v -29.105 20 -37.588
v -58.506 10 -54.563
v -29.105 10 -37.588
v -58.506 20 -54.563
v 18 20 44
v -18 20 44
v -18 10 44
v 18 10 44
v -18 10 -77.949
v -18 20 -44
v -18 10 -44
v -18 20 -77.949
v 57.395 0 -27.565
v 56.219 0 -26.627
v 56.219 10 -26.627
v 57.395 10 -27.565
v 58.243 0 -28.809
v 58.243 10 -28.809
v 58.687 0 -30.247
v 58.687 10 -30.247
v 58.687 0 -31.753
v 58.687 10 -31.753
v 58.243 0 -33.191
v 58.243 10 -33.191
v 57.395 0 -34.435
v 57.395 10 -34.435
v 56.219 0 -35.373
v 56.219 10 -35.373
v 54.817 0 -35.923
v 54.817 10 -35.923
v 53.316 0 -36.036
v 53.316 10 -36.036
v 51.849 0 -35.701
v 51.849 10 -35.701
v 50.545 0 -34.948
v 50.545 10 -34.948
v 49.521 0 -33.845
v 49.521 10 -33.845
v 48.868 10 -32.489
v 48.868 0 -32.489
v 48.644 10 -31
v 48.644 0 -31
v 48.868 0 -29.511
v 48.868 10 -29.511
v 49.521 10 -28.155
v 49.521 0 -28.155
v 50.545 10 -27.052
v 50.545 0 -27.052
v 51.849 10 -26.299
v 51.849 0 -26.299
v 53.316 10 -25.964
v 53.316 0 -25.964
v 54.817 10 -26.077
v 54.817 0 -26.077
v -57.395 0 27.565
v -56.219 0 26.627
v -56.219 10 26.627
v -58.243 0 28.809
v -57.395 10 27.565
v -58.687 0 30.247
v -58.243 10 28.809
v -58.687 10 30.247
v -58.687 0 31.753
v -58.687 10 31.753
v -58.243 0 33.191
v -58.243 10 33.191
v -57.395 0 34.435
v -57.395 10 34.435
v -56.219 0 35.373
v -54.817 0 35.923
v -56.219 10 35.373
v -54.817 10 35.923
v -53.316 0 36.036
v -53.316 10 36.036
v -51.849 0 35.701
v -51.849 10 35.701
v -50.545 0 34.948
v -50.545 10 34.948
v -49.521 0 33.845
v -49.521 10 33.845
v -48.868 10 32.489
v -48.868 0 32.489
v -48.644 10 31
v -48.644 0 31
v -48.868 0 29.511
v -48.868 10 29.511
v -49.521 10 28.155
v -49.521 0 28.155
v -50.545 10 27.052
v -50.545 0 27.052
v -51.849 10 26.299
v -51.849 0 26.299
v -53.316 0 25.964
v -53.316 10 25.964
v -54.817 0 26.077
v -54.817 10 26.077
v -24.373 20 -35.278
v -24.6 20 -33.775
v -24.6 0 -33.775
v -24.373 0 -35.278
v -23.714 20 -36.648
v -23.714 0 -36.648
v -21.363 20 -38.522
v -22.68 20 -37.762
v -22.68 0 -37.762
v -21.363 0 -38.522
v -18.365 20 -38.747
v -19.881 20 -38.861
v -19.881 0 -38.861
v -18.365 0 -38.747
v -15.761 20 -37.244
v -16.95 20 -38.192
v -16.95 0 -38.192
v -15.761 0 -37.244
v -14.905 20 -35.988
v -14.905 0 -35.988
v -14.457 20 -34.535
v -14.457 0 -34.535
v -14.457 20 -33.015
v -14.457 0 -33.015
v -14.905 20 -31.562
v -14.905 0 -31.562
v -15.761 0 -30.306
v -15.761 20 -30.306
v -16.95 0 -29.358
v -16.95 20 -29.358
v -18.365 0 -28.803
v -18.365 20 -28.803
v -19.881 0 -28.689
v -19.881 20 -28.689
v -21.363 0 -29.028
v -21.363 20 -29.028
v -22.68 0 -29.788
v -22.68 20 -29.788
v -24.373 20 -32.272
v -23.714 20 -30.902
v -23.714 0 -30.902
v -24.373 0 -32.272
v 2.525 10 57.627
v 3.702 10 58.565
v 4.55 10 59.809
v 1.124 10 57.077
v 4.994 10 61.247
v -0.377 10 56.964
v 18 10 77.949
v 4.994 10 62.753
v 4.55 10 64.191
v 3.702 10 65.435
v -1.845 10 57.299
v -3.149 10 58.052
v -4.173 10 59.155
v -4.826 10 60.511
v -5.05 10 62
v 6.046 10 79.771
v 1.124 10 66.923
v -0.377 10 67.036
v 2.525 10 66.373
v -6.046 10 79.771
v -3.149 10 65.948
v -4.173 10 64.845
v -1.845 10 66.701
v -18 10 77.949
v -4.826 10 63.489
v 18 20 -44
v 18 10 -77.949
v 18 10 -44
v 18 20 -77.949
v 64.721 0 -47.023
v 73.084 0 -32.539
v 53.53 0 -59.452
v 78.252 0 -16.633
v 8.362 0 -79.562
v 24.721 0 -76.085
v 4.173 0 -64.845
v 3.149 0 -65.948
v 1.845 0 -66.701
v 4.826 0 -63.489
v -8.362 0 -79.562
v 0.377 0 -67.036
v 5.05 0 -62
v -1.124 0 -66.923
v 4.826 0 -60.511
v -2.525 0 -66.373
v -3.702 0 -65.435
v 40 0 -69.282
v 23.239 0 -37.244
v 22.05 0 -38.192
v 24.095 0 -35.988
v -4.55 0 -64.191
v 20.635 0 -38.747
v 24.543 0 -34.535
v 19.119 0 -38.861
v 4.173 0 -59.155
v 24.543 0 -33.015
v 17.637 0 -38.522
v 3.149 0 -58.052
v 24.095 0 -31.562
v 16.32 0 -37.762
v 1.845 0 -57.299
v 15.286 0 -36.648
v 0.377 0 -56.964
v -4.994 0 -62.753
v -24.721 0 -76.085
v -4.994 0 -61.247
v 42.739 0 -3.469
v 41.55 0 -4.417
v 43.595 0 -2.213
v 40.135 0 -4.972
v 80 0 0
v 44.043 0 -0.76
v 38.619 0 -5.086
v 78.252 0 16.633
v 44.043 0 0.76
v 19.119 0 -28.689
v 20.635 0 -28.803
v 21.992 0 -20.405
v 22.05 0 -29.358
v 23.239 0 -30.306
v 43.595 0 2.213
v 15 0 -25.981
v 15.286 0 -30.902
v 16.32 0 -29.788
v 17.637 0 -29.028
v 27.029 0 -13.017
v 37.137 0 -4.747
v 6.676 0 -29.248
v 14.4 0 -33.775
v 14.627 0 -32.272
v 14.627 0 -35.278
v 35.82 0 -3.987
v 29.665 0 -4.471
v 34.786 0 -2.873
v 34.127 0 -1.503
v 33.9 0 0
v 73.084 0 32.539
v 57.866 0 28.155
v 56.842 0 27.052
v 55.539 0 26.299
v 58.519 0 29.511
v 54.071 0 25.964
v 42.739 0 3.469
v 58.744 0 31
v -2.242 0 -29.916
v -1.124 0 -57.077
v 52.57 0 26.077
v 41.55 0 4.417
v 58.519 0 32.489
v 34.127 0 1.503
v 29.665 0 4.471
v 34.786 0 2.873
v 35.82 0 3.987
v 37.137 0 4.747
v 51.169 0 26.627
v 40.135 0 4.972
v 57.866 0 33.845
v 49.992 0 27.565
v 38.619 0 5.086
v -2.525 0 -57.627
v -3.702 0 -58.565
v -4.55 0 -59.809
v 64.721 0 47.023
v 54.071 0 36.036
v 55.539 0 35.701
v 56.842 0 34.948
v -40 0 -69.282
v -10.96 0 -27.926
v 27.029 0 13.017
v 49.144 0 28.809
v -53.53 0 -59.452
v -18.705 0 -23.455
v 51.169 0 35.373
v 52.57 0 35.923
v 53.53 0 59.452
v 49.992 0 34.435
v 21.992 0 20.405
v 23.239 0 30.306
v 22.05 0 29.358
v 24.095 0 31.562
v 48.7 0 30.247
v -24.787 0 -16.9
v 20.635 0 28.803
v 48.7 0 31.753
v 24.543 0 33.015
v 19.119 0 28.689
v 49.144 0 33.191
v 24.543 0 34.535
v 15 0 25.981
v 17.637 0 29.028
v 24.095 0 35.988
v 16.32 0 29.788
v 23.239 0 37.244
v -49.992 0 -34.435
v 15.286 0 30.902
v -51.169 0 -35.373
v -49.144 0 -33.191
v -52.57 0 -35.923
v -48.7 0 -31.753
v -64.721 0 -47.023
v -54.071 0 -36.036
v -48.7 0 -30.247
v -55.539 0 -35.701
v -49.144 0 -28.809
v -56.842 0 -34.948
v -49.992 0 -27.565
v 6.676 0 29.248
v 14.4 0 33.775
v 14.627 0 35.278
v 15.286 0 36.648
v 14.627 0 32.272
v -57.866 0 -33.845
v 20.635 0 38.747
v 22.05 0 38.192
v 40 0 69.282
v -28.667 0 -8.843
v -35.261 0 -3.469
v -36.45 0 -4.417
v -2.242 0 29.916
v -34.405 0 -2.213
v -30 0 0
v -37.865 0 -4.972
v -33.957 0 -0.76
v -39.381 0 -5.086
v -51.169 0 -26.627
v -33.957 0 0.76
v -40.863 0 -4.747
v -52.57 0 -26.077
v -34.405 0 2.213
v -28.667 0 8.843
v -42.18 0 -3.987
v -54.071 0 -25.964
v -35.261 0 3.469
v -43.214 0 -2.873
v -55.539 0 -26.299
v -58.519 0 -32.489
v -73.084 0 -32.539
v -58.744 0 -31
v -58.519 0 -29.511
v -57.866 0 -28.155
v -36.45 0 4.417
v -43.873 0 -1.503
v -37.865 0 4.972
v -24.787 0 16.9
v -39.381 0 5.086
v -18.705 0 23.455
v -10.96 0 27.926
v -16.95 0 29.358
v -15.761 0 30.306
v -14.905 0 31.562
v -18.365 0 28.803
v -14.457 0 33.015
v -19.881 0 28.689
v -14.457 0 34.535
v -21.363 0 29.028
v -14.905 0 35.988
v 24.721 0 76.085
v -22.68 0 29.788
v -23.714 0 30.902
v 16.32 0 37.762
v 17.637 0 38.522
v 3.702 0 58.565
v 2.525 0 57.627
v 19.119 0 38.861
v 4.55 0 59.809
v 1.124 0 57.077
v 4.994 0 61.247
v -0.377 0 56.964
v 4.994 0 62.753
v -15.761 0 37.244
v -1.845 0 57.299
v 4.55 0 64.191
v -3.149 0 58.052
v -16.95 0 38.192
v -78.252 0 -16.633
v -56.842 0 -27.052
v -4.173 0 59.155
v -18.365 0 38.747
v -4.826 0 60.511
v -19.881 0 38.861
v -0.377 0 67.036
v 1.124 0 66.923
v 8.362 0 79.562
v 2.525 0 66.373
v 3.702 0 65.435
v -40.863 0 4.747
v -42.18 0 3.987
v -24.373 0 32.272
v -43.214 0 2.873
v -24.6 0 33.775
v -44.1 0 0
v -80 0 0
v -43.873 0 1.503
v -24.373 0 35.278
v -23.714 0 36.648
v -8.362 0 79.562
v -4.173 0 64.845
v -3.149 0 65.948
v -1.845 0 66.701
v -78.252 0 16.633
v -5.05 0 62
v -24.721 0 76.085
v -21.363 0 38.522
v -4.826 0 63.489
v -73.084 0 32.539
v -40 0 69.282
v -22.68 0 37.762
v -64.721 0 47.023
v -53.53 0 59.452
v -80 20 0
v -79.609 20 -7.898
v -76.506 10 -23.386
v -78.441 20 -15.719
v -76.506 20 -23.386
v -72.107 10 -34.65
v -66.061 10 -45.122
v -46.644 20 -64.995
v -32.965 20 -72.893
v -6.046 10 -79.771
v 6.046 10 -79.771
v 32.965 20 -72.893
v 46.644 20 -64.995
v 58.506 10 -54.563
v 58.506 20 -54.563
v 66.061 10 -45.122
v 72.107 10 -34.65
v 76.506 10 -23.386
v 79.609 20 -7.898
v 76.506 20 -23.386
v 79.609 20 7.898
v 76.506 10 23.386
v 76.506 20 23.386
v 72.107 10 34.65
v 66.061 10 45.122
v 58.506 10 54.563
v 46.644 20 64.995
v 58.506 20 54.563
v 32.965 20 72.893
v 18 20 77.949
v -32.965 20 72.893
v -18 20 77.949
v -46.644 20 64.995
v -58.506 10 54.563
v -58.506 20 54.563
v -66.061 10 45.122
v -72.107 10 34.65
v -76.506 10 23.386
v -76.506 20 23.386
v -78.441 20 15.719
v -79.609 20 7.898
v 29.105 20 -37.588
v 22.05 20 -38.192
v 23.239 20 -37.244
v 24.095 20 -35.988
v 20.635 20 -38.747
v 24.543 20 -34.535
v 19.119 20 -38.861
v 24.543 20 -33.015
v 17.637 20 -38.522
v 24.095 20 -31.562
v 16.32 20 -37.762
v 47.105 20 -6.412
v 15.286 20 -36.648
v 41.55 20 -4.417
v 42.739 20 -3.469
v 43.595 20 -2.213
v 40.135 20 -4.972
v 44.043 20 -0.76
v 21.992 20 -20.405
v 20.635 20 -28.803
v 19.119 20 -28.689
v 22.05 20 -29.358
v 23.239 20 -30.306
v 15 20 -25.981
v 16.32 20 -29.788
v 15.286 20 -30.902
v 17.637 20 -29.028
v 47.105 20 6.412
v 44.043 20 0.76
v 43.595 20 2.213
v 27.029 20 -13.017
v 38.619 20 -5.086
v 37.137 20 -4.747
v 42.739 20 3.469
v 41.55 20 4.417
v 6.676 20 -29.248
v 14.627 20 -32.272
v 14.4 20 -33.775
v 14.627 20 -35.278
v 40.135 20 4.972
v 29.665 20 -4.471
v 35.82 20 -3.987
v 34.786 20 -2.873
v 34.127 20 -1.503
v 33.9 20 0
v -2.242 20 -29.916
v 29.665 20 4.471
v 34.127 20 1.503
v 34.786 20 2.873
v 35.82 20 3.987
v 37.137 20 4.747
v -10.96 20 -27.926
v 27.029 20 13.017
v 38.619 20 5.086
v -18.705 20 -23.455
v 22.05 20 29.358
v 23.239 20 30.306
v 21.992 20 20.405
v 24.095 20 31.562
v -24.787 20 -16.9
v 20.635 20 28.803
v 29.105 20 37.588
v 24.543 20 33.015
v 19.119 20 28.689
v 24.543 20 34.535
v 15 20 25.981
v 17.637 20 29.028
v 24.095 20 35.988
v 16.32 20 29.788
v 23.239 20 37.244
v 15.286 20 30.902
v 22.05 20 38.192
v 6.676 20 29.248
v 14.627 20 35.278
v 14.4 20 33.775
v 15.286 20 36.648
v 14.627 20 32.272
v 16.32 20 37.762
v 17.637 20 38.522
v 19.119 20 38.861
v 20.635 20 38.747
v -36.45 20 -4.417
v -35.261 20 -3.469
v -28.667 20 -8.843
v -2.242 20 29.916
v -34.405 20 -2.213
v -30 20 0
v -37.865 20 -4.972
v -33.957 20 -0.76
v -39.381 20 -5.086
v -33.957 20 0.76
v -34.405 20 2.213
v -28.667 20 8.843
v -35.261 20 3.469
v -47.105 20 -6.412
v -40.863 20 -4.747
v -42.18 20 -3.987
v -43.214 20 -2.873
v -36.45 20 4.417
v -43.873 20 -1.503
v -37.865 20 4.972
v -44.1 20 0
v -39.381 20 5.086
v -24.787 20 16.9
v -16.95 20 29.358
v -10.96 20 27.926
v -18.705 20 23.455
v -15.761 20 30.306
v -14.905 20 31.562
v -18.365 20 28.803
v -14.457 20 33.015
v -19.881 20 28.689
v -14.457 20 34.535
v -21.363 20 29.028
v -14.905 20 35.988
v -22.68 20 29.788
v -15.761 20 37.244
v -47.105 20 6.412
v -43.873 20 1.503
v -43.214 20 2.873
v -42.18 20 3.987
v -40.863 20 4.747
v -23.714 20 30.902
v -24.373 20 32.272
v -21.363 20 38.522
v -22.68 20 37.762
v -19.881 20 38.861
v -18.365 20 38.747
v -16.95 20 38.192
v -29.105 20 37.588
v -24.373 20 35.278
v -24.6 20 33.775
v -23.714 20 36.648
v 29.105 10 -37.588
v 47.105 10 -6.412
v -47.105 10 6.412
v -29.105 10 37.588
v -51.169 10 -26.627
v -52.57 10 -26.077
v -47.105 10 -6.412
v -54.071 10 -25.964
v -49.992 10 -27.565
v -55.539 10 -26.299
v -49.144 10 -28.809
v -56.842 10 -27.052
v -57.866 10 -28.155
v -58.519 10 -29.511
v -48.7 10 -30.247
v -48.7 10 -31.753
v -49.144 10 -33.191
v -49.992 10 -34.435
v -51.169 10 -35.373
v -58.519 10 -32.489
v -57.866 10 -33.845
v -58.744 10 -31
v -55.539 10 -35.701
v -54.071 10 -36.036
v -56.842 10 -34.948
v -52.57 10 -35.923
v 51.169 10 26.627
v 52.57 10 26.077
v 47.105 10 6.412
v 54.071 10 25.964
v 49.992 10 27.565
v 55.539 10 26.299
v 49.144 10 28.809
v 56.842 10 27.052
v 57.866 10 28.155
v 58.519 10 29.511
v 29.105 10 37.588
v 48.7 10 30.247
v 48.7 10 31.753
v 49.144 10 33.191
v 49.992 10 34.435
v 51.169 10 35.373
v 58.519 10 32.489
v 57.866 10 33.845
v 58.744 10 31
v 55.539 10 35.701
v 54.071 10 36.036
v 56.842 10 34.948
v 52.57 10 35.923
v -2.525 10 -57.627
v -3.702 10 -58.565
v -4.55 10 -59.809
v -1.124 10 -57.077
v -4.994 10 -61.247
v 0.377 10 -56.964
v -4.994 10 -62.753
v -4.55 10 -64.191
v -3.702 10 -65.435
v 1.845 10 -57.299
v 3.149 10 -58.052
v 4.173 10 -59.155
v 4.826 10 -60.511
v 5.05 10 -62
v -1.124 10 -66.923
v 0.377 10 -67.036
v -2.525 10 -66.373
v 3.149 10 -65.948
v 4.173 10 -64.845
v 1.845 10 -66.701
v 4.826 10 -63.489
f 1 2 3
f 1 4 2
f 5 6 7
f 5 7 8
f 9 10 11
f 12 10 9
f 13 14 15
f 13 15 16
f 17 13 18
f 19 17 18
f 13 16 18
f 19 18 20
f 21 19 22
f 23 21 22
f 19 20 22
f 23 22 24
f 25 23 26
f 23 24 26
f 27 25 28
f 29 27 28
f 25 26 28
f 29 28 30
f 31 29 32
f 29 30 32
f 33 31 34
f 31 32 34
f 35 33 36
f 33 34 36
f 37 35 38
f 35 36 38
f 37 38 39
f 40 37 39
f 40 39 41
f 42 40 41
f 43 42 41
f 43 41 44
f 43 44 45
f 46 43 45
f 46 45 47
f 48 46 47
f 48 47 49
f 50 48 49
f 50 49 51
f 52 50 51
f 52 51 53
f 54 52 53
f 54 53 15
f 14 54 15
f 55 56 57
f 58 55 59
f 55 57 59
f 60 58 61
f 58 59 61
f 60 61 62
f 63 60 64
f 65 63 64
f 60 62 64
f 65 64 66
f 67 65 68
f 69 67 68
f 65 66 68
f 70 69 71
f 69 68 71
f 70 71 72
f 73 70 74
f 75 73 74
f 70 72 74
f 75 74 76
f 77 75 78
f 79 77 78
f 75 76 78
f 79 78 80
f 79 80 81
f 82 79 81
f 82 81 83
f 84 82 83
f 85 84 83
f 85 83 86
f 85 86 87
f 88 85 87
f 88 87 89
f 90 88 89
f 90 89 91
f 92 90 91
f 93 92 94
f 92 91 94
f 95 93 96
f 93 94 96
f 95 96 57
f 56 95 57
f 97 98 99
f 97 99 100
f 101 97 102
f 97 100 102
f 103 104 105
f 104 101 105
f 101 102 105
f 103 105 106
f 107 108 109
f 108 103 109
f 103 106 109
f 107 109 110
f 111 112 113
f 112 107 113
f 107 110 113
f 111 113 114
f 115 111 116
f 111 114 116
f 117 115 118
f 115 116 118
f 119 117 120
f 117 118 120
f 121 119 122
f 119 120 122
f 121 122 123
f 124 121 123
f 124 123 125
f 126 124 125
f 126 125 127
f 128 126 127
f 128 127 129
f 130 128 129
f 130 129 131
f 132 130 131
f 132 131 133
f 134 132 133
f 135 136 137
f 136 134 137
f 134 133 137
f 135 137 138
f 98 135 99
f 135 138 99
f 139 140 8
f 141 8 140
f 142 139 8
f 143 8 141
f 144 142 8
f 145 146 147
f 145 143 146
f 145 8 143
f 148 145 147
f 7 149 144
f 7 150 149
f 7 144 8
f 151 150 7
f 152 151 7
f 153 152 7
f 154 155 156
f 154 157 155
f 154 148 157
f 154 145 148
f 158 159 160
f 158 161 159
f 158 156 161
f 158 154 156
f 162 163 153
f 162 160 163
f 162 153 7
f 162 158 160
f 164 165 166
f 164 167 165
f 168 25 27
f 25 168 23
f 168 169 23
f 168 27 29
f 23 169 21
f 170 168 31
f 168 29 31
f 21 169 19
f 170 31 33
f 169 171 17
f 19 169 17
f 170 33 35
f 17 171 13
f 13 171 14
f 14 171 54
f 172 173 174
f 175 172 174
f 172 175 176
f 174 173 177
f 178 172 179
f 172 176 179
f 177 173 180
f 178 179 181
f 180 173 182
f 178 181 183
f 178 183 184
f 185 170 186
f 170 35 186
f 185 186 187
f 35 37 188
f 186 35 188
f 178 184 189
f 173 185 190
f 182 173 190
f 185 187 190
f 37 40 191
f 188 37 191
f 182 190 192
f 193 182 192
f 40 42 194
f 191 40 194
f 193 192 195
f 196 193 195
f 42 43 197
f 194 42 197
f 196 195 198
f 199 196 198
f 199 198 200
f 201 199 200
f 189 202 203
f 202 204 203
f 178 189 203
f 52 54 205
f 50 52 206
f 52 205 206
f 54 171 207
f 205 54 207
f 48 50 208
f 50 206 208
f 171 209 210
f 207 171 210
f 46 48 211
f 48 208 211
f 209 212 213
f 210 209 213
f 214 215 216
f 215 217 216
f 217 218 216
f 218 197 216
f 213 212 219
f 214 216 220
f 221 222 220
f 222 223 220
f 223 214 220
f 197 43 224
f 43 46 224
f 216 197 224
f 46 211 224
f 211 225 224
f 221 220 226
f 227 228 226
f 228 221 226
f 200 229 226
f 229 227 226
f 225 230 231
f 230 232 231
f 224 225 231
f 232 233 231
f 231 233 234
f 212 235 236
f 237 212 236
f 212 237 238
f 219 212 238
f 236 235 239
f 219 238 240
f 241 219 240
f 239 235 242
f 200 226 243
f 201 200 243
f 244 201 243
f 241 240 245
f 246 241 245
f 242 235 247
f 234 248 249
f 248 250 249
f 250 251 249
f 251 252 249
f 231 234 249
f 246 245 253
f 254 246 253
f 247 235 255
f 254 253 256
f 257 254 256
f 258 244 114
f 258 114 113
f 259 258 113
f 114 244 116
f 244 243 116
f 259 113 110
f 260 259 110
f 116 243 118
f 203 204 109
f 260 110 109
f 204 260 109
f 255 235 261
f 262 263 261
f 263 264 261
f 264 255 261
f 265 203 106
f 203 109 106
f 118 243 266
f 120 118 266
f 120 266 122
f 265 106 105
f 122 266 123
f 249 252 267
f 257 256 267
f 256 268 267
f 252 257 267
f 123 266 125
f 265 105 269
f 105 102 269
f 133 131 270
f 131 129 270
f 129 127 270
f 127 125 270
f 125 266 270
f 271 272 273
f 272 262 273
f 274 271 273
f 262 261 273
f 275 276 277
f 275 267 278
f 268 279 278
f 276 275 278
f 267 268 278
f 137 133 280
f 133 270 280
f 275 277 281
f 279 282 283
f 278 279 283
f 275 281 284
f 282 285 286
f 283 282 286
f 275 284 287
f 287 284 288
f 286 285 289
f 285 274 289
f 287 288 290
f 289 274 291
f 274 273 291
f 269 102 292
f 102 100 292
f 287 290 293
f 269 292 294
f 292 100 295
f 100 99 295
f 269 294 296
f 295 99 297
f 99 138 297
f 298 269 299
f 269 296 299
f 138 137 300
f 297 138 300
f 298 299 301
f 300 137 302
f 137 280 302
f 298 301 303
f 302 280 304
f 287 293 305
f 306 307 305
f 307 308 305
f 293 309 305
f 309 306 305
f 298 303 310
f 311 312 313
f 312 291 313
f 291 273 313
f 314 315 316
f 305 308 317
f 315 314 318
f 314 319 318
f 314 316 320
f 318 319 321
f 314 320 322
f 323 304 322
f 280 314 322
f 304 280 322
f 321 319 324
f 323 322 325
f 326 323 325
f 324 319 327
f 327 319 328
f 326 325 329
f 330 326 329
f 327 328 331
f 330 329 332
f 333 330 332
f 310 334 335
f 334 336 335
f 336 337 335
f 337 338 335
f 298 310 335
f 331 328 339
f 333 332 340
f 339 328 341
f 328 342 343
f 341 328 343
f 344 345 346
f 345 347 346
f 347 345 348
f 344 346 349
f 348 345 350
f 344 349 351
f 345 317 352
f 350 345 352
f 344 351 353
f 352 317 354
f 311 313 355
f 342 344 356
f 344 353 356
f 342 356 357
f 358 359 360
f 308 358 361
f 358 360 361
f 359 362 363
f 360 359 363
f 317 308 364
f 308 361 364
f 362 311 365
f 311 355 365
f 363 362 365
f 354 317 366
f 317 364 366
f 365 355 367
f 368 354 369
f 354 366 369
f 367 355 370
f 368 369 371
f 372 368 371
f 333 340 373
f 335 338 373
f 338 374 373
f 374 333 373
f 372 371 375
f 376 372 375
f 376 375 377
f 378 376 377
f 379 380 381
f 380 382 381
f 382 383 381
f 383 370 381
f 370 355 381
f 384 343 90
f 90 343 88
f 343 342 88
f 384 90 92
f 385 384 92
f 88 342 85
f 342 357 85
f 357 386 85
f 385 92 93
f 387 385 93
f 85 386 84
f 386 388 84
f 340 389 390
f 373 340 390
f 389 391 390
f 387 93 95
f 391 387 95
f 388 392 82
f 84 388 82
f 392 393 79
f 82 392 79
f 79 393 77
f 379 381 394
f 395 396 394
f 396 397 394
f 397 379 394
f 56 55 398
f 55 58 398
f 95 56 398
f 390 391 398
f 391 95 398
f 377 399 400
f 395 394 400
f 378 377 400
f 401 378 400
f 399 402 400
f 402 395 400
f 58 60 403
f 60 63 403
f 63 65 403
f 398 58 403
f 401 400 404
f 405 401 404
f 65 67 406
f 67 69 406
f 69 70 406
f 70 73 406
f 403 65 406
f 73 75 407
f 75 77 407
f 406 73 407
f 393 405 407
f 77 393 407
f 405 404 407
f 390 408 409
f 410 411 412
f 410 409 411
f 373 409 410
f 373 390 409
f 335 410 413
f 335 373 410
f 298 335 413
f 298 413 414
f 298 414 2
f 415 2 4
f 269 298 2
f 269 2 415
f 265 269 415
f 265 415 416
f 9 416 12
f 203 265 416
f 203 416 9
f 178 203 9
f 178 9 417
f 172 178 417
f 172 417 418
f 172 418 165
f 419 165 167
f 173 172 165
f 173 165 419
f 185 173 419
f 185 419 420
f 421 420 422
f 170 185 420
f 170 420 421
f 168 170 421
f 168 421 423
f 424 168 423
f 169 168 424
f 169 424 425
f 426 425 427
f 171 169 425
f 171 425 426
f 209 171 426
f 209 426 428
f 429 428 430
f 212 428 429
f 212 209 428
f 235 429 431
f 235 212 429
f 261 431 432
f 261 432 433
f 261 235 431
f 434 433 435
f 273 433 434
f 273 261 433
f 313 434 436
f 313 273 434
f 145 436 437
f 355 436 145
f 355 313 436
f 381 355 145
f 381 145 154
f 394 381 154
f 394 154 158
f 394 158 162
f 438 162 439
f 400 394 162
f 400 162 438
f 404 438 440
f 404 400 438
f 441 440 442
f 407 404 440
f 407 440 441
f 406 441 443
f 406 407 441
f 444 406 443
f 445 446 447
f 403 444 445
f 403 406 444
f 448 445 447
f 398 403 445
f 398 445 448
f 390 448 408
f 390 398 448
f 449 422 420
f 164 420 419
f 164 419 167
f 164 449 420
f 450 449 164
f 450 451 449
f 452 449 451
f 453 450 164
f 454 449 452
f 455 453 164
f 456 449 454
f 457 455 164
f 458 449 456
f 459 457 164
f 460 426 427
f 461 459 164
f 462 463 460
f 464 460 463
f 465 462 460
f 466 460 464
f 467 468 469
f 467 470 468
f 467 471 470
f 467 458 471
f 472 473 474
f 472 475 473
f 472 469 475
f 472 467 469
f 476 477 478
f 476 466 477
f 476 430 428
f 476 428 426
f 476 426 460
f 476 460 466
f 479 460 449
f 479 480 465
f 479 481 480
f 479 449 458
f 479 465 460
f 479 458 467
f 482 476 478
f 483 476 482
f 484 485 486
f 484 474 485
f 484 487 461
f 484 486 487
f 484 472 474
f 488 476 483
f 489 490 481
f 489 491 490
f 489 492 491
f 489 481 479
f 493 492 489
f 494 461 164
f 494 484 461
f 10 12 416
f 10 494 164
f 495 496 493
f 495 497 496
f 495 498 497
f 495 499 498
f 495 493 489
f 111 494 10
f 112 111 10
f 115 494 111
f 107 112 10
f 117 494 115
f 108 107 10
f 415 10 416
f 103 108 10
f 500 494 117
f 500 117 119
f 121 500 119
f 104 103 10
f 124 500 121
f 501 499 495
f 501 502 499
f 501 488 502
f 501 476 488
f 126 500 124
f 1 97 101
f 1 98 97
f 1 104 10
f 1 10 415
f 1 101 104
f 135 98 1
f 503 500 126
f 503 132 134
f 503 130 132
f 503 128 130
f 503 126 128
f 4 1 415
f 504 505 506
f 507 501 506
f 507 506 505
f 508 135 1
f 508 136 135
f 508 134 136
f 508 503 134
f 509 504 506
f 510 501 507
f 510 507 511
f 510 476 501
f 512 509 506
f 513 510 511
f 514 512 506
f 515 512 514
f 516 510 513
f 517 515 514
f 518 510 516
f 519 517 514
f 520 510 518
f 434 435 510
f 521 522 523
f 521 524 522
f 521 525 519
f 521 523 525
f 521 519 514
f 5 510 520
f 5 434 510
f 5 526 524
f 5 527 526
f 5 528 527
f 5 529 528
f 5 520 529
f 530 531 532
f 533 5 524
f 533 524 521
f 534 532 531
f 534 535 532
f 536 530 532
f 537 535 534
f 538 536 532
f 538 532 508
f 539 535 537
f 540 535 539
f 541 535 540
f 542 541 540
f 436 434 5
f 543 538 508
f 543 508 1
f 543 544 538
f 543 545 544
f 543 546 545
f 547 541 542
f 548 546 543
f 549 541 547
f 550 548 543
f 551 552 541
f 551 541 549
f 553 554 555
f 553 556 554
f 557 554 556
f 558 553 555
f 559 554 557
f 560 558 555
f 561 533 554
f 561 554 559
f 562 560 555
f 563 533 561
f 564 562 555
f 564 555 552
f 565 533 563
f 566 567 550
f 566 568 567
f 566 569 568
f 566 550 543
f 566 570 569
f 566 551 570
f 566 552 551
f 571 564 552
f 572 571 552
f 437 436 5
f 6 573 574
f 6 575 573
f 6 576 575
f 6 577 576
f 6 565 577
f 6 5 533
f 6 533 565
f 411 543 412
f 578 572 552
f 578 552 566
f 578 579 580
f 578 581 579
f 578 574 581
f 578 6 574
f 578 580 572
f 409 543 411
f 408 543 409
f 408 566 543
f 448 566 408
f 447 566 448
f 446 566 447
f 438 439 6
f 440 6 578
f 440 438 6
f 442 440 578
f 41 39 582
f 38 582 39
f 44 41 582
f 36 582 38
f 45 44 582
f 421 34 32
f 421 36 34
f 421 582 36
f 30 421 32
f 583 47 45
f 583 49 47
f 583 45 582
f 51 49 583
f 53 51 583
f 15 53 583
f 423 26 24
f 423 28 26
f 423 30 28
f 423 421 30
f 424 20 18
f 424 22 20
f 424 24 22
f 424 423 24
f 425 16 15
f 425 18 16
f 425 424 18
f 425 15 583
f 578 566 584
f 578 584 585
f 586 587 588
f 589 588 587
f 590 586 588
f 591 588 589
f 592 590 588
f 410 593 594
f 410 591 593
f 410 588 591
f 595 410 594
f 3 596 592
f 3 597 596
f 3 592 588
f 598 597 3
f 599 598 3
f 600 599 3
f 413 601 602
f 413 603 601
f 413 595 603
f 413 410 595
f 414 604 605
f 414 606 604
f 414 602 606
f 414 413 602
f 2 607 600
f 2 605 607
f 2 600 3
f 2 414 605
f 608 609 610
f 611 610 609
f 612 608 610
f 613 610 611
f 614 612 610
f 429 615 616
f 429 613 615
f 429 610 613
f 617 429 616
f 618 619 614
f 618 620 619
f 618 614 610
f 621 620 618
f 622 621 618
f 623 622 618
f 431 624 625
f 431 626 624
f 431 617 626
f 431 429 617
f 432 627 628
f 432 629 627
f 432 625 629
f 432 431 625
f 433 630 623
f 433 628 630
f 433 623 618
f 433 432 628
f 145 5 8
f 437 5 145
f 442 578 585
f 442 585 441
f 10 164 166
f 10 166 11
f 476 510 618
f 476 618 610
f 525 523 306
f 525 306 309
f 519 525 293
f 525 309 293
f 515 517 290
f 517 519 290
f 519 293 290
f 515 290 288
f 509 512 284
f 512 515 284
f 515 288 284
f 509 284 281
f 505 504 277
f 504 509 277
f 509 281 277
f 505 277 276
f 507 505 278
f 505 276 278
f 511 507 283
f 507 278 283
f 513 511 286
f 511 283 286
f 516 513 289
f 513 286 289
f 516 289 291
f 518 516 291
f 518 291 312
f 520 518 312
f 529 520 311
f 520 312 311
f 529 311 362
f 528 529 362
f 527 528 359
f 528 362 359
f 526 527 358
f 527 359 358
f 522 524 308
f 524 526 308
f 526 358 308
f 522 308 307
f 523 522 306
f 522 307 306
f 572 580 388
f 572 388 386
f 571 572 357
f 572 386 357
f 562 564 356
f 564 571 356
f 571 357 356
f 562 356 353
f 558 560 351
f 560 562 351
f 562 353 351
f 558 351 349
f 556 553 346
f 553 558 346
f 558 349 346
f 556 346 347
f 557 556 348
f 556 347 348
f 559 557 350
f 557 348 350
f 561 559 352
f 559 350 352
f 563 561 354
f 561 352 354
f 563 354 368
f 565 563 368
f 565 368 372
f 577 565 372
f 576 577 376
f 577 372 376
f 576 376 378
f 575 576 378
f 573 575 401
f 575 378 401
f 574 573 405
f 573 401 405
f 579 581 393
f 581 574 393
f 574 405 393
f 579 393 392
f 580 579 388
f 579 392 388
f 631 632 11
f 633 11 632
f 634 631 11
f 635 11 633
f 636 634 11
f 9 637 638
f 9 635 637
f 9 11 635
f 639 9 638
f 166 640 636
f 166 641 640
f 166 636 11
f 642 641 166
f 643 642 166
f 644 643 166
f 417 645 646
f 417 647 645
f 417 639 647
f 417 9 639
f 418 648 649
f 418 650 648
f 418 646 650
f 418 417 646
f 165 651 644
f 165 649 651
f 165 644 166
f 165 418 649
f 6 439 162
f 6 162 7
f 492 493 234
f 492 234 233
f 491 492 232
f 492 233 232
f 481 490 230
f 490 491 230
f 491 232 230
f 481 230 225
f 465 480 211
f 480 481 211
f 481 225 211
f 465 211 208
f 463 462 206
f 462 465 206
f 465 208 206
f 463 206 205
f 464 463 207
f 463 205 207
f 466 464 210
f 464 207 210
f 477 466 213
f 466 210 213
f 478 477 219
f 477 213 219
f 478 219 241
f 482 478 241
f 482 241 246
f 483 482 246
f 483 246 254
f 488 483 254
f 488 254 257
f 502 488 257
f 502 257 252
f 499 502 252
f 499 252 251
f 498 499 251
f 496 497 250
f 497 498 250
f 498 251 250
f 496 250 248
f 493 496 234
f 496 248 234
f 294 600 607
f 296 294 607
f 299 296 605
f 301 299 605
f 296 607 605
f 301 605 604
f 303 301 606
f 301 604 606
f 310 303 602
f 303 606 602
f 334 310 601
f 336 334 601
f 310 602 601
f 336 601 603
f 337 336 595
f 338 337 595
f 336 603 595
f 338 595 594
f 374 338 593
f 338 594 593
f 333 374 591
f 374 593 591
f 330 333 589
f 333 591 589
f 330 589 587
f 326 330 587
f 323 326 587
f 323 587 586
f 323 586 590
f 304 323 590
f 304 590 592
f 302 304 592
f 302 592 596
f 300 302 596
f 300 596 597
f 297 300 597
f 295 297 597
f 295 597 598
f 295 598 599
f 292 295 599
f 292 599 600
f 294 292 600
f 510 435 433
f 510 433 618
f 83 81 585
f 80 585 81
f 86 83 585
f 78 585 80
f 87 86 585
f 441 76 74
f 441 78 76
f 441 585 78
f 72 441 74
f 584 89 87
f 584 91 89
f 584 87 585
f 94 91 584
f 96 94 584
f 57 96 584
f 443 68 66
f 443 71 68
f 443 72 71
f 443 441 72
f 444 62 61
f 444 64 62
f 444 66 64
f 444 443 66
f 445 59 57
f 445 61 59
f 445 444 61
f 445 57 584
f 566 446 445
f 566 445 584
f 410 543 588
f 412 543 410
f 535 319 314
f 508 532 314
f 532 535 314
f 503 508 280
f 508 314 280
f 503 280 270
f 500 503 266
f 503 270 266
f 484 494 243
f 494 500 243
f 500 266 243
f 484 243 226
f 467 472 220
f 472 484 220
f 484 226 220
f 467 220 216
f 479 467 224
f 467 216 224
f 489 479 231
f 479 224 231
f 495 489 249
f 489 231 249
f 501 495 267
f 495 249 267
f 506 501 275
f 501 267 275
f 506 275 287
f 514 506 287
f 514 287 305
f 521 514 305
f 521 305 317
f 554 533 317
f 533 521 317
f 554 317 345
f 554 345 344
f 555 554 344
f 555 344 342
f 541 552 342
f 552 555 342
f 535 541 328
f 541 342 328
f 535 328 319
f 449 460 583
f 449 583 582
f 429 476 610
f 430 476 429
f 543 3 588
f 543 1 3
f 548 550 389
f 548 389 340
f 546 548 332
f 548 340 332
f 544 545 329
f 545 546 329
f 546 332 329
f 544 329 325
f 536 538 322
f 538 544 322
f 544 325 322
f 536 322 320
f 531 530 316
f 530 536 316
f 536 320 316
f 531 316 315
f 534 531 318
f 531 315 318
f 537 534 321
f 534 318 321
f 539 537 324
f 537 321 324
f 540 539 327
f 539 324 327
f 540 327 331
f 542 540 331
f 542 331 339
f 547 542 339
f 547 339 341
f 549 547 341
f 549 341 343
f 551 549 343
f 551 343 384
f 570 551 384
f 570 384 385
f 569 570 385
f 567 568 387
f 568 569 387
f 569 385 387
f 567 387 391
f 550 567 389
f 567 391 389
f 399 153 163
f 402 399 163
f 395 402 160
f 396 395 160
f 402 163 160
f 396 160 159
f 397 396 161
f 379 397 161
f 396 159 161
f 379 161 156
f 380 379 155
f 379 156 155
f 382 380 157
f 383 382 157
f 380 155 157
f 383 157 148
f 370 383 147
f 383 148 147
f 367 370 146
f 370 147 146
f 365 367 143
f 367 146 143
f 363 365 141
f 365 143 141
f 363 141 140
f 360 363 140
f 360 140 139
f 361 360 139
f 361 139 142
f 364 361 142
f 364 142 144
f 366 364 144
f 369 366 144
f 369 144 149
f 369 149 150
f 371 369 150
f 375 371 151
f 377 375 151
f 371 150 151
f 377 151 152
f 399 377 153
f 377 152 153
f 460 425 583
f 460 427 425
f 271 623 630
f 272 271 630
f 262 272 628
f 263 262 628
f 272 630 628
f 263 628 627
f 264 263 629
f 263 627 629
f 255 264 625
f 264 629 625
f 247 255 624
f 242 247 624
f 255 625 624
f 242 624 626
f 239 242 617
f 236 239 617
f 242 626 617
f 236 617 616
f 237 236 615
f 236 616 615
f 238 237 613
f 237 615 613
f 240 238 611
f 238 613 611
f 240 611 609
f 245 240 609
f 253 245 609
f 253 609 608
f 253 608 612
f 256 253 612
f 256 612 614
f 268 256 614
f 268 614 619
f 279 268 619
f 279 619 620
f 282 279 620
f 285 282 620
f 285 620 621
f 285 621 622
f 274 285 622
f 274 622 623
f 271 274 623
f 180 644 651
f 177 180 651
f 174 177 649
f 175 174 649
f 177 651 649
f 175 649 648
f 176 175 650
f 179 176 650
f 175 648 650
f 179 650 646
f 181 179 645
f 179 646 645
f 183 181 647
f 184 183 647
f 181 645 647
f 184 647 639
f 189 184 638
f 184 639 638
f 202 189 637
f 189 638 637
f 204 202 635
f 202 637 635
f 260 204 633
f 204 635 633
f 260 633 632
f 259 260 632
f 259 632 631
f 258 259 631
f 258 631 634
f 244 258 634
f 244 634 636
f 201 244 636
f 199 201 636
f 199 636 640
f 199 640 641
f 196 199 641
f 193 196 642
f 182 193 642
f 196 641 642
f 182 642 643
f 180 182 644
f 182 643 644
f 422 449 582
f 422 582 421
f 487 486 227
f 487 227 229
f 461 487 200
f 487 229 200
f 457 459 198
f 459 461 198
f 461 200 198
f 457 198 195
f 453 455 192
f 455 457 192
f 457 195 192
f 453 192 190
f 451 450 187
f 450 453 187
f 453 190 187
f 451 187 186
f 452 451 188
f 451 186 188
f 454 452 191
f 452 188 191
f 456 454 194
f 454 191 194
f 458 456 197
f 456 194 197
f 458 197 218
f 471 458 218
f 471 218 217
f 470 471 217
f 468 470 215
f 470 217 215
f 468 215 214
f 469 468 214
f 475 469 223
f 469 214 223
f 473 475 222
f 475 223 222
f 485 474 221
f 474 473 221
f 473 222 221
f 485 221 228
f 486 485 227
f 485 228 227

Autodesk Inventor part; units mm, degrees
ref_plane "YZ Plane" through (0, 0, 0) normal (1, 0, 0) x (0, 1, 0)
ref_plane "XZ Plane" through (0, 0, 0) normal (0, 1, 0) x (-1, 0, 0)
ref_plane "XY Plane" through (0, 0, 0) normal (0, 0, 1) x (1, 0, 0)
sketch "Sketch1" plane through (0, 0, 0) normal (0, 1, 0) x (-1, 0, 0)
  circle A0 centre (0, 0) radius 30
  circle A1 centre (0, 0) radius 39 construction
  circle A2 centre (0, 0) radius 80
  circle A3 centre (39, 0) radius 5.1
  circle A4 centre (19.5, 33.775) radius 5.1
  circle A5 centre (-19.5, 33.775) radius 5.1
  circle A6 centre (-39, 0) radius 5.1
  circle A7 centre (-19.5, -33.775) radius 5.1
  circle A8 centre (19.5, -33.775) radius 5.1
  dimension "d0" = 78
  dimension "d1" = 160
  dimension "d2" = 60
  dimension "d3" = 10.2
  dimension "d6" = 360
extrude "Extrusion1" add sketch "Sketch1" along normal blind 20
sketch "Sketch2" plane through (0, 20, 0) normal (0, 1, 0) x (1, 0, 0)
  circle A0 centre (0, 0) radius 30 construction
  circle A1 centre (-19.5, 33.775) radius 5.1 construction
  circle A2 centre (19.5, 33.775) radius 5.1 construction
  circle A3 centre (39, 0) radius 5.1 construction
  circle A4 centre (19.5, -33.775) radius 5.1 construction
  circle A5 centre (-19.5, -33.775) radius 5.1 construction
  circle A6 centre (-39, 0) radius 5.1 construction
  circle A7 centre (0, 0) radius 80 construction
  line L0 (0, -80) -> (0, 80) construction
  line L1 (-18, 80) -> (18, 80)
  line L2 (18, 80) -> (18, 44)
  line L3 (18, 44) -> (-18, 44)
  line L4 (-18, 44) -> (-18, 80)
  circle A8 centre (0, 0) radius 80 construction
  circle A9 centre (0, 62) radius 5.05
  dimension "d10" = 36
  dimension "d11" = 10.1
  dimension "d12" = 18
  dimension "d13" = 36
extrude "Extrusion2" cut sketch "Sketch2" against normal blind 10
extrude "Extrusion3" cut sketch "Sketch2" against normal through all contours A9
pattern_circular "Circular Pattern1" count 6 over 360 about axis through (0, 0, 0) along (0, 1, 0) of "Extrusion2", "Extrusion3"
properties part number "terminal-cap"
